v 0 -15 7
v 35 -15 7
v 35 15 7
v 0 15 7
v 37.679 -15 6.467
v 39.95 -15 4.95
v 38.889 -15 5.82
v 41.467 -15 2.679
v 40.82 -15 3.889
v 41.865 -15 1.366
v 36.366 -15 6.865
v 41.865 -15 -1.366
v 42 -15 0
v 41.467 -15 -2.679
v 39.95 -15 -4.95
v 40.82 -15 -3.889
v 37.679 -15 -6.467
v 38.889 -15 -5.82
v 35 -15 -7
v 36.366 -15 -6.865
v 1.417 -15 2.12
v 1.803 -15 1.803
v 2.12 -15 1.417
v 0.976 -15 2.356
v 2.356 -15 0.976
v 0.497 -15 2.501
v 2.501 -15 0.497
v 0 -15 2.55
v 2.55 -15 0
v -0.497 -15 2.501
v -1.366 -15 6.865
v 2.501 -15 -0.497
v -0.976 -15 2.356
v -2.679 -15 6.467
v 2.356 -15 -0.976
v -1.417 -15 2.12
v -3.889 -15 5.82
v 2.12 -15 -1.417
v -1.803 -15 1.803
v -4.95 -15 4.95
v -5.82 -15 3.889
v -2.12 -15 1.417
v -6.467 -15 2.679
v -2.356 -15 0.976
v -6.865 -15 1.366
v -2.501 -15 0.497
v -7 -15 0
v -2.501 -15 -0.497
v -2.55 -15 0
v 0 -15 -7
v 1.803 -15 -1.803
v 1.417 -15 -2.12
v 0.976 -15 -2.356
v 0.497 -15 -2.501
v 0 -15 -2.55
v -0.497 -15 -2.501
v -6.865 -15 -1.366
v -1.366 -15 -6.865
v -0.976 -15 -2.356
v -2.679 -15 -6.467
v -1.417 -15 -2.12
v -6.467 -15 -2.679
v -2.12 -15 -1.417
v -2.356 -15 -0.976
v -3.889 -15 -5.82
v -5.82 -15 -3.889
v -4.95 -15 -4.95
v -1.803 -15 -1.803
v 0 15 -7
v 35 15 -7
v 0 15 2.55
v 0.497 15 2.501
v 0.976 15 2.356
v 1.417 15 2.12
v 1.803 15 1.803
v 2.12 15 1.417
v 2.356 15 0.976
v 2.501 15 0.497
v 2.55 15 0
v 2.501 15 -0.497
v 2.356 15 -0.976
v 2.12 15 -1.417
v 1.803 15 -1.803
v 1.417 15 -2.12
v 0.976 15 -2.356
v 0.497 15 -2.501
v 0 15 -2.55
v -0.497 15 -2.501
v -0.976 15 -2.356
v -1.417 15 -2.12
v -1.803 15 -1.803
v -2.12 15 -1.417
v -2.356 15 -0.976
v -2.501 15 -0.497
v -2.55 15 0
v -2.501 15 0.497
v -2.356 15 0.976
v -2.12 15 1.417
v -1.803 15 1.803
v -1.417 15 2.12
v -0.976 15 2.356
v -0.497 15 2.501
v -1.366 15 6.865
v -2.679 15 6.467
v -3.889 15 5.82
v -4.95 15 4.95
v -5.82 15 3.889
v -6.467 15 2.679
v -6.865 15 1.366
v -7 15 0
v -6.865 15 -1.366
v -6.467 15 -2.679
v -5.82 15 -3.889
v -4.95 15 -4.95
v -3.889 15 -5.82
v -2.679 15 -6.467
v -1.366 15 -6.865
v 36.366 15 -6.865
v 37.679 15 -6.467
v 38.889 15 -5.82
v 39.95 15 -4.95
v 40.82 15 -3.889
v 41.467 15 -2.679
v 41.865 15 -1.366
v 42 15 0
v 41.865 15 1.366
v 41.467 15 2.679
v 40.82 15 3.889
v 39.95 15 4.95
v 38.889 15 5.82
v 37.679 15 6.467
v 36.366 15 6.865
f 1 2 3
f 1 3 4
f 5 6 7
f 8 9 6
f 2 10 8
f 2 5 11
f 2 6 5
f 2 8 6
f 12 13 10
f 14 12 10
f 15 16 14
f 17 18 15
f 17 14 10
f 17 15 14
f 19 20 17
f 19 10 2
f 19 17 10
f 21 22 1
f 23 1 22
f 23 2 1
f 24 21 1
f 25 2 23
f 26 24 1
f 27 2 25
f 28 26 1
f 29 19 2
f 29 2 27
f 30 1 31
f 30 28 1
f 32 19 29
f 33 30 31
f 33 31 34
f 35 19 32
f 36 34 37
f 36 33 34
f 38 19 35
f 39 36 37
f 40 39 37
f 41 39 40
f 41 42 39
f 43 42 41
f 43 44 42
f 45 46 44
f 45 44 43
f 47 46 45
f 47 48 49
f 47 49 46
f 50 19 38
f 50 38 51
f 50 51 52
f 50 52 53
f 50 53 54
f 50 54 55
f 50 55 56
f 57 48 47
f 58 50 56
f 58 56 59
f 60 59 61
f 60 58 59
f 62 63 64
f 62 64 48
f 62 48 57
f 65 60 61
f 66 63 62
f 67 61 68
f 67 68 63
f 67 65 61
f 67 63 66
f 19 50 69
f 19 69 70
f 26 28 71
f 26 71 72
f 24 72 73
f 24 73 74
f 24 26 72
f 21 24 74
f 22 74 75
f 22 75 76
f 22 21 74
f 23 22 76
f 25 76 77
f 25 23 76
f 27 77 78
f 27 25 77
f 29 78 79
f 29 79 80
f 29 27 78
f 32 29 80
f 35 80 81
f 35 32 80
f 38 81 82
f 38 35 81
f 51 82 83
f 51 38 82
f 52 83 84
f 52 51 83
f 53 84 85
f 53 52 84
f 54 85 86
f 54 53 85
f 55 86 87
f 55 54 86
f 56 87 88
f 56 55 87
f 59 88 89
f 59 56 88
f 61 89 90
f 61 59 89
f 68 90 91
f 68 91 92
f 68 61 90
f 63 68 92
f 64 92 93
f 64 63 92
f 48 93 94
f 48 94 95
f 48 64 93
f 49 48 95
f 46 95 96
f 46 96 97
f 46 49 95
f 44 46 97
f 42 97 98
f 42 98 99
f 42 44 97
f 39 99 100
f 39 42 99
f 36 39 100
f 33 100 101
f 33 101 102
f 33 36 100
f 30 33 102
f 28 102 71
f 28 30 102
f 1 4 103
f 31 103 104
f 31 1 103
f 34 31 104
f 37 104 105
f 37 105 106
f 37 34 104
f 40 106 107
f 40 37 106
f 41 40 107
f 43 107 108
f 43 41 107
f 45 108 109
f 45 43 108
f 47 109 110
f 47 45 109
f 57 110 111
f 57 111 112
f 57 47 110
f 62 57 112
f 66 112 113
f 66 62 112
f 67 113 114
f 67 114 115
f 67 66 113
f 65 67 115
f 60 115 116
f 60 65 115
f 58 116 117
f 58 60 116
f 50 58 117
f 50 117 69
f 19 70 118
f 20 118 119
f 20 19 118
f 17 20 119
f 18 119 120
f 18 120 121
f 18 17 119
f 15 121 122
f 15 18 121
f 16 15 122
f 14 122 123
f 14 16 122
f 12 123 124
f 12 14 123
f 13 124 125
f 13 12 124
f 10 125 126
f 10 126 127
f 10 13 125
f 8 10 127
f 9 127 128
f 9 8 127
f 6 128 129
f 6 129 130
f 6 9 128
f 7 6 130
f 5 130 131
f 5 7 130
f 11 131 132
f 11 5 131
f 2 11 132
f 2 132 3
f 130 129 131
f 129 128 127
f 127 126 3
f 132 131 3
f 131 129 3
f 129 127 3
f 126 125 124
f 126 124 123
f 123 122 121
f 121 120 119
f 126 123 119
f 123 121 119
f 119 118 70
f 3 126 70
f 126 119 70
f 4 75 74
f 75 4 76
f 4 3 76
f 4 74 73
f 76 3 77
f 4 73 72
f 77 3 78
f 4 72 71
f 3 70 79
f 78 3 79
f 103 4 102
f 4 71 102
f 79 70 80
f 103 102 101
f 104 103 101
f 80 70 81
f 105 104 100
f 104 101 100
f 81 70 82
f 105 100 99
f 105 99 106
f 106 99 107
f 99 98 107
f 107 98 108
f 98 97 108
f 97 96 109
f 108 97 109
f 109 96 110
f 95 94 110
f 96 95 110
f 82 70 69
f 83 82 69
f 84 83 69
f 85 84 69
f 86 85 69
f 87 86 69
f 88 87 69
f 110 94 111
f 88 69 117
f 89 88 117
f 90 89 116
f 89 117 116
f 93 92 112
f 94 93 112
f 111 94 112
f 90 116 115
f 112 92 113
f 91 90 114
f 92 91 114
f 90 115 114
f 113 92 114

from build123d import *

# Parameters (mm, degrees)
AUFSATZ_LINEAR_AUSTRAGEN1_DEPTH      = 15
AUFSATZ_LINEAR_AUSTRAGEN1_DEPTH_BACK = 15
SKIZZE1_R                            = 2.55


with BuildPart() as part:
    # Skizze1 → Aufsatz-Linear austragen1 (new, two sides: drawn at the far end of the back side and taken through both)
    with BuildSketch(Plane(origin=(0, 0, 0), x_dir=(1, 0, 0), z_dir=(0, 1, 0)).offset(-AUFSATZ_LINEAR_AUSTRAGEN1_DEPTH_BACK)):
        with BuildLine():
            Line((0, 7), (35, 7))
            ThreePointArc((35, 7), (42, 0), (35, -7))
            Line((35, -7), (0, -7))
            ThreePointArc((0, -7), (-7, 0), (0, 7))
        make_face()
        Circle(SKIZZE1_R, mode=Mode.SUBTRACT)
    extrude(amount=AUFSATZ_LINEAR_AUSTRAGEN1_DEPTH + AUFSATZ_LINEAR_AUSTRAGEN1_DEPTH_BACK)


solid = part.part
